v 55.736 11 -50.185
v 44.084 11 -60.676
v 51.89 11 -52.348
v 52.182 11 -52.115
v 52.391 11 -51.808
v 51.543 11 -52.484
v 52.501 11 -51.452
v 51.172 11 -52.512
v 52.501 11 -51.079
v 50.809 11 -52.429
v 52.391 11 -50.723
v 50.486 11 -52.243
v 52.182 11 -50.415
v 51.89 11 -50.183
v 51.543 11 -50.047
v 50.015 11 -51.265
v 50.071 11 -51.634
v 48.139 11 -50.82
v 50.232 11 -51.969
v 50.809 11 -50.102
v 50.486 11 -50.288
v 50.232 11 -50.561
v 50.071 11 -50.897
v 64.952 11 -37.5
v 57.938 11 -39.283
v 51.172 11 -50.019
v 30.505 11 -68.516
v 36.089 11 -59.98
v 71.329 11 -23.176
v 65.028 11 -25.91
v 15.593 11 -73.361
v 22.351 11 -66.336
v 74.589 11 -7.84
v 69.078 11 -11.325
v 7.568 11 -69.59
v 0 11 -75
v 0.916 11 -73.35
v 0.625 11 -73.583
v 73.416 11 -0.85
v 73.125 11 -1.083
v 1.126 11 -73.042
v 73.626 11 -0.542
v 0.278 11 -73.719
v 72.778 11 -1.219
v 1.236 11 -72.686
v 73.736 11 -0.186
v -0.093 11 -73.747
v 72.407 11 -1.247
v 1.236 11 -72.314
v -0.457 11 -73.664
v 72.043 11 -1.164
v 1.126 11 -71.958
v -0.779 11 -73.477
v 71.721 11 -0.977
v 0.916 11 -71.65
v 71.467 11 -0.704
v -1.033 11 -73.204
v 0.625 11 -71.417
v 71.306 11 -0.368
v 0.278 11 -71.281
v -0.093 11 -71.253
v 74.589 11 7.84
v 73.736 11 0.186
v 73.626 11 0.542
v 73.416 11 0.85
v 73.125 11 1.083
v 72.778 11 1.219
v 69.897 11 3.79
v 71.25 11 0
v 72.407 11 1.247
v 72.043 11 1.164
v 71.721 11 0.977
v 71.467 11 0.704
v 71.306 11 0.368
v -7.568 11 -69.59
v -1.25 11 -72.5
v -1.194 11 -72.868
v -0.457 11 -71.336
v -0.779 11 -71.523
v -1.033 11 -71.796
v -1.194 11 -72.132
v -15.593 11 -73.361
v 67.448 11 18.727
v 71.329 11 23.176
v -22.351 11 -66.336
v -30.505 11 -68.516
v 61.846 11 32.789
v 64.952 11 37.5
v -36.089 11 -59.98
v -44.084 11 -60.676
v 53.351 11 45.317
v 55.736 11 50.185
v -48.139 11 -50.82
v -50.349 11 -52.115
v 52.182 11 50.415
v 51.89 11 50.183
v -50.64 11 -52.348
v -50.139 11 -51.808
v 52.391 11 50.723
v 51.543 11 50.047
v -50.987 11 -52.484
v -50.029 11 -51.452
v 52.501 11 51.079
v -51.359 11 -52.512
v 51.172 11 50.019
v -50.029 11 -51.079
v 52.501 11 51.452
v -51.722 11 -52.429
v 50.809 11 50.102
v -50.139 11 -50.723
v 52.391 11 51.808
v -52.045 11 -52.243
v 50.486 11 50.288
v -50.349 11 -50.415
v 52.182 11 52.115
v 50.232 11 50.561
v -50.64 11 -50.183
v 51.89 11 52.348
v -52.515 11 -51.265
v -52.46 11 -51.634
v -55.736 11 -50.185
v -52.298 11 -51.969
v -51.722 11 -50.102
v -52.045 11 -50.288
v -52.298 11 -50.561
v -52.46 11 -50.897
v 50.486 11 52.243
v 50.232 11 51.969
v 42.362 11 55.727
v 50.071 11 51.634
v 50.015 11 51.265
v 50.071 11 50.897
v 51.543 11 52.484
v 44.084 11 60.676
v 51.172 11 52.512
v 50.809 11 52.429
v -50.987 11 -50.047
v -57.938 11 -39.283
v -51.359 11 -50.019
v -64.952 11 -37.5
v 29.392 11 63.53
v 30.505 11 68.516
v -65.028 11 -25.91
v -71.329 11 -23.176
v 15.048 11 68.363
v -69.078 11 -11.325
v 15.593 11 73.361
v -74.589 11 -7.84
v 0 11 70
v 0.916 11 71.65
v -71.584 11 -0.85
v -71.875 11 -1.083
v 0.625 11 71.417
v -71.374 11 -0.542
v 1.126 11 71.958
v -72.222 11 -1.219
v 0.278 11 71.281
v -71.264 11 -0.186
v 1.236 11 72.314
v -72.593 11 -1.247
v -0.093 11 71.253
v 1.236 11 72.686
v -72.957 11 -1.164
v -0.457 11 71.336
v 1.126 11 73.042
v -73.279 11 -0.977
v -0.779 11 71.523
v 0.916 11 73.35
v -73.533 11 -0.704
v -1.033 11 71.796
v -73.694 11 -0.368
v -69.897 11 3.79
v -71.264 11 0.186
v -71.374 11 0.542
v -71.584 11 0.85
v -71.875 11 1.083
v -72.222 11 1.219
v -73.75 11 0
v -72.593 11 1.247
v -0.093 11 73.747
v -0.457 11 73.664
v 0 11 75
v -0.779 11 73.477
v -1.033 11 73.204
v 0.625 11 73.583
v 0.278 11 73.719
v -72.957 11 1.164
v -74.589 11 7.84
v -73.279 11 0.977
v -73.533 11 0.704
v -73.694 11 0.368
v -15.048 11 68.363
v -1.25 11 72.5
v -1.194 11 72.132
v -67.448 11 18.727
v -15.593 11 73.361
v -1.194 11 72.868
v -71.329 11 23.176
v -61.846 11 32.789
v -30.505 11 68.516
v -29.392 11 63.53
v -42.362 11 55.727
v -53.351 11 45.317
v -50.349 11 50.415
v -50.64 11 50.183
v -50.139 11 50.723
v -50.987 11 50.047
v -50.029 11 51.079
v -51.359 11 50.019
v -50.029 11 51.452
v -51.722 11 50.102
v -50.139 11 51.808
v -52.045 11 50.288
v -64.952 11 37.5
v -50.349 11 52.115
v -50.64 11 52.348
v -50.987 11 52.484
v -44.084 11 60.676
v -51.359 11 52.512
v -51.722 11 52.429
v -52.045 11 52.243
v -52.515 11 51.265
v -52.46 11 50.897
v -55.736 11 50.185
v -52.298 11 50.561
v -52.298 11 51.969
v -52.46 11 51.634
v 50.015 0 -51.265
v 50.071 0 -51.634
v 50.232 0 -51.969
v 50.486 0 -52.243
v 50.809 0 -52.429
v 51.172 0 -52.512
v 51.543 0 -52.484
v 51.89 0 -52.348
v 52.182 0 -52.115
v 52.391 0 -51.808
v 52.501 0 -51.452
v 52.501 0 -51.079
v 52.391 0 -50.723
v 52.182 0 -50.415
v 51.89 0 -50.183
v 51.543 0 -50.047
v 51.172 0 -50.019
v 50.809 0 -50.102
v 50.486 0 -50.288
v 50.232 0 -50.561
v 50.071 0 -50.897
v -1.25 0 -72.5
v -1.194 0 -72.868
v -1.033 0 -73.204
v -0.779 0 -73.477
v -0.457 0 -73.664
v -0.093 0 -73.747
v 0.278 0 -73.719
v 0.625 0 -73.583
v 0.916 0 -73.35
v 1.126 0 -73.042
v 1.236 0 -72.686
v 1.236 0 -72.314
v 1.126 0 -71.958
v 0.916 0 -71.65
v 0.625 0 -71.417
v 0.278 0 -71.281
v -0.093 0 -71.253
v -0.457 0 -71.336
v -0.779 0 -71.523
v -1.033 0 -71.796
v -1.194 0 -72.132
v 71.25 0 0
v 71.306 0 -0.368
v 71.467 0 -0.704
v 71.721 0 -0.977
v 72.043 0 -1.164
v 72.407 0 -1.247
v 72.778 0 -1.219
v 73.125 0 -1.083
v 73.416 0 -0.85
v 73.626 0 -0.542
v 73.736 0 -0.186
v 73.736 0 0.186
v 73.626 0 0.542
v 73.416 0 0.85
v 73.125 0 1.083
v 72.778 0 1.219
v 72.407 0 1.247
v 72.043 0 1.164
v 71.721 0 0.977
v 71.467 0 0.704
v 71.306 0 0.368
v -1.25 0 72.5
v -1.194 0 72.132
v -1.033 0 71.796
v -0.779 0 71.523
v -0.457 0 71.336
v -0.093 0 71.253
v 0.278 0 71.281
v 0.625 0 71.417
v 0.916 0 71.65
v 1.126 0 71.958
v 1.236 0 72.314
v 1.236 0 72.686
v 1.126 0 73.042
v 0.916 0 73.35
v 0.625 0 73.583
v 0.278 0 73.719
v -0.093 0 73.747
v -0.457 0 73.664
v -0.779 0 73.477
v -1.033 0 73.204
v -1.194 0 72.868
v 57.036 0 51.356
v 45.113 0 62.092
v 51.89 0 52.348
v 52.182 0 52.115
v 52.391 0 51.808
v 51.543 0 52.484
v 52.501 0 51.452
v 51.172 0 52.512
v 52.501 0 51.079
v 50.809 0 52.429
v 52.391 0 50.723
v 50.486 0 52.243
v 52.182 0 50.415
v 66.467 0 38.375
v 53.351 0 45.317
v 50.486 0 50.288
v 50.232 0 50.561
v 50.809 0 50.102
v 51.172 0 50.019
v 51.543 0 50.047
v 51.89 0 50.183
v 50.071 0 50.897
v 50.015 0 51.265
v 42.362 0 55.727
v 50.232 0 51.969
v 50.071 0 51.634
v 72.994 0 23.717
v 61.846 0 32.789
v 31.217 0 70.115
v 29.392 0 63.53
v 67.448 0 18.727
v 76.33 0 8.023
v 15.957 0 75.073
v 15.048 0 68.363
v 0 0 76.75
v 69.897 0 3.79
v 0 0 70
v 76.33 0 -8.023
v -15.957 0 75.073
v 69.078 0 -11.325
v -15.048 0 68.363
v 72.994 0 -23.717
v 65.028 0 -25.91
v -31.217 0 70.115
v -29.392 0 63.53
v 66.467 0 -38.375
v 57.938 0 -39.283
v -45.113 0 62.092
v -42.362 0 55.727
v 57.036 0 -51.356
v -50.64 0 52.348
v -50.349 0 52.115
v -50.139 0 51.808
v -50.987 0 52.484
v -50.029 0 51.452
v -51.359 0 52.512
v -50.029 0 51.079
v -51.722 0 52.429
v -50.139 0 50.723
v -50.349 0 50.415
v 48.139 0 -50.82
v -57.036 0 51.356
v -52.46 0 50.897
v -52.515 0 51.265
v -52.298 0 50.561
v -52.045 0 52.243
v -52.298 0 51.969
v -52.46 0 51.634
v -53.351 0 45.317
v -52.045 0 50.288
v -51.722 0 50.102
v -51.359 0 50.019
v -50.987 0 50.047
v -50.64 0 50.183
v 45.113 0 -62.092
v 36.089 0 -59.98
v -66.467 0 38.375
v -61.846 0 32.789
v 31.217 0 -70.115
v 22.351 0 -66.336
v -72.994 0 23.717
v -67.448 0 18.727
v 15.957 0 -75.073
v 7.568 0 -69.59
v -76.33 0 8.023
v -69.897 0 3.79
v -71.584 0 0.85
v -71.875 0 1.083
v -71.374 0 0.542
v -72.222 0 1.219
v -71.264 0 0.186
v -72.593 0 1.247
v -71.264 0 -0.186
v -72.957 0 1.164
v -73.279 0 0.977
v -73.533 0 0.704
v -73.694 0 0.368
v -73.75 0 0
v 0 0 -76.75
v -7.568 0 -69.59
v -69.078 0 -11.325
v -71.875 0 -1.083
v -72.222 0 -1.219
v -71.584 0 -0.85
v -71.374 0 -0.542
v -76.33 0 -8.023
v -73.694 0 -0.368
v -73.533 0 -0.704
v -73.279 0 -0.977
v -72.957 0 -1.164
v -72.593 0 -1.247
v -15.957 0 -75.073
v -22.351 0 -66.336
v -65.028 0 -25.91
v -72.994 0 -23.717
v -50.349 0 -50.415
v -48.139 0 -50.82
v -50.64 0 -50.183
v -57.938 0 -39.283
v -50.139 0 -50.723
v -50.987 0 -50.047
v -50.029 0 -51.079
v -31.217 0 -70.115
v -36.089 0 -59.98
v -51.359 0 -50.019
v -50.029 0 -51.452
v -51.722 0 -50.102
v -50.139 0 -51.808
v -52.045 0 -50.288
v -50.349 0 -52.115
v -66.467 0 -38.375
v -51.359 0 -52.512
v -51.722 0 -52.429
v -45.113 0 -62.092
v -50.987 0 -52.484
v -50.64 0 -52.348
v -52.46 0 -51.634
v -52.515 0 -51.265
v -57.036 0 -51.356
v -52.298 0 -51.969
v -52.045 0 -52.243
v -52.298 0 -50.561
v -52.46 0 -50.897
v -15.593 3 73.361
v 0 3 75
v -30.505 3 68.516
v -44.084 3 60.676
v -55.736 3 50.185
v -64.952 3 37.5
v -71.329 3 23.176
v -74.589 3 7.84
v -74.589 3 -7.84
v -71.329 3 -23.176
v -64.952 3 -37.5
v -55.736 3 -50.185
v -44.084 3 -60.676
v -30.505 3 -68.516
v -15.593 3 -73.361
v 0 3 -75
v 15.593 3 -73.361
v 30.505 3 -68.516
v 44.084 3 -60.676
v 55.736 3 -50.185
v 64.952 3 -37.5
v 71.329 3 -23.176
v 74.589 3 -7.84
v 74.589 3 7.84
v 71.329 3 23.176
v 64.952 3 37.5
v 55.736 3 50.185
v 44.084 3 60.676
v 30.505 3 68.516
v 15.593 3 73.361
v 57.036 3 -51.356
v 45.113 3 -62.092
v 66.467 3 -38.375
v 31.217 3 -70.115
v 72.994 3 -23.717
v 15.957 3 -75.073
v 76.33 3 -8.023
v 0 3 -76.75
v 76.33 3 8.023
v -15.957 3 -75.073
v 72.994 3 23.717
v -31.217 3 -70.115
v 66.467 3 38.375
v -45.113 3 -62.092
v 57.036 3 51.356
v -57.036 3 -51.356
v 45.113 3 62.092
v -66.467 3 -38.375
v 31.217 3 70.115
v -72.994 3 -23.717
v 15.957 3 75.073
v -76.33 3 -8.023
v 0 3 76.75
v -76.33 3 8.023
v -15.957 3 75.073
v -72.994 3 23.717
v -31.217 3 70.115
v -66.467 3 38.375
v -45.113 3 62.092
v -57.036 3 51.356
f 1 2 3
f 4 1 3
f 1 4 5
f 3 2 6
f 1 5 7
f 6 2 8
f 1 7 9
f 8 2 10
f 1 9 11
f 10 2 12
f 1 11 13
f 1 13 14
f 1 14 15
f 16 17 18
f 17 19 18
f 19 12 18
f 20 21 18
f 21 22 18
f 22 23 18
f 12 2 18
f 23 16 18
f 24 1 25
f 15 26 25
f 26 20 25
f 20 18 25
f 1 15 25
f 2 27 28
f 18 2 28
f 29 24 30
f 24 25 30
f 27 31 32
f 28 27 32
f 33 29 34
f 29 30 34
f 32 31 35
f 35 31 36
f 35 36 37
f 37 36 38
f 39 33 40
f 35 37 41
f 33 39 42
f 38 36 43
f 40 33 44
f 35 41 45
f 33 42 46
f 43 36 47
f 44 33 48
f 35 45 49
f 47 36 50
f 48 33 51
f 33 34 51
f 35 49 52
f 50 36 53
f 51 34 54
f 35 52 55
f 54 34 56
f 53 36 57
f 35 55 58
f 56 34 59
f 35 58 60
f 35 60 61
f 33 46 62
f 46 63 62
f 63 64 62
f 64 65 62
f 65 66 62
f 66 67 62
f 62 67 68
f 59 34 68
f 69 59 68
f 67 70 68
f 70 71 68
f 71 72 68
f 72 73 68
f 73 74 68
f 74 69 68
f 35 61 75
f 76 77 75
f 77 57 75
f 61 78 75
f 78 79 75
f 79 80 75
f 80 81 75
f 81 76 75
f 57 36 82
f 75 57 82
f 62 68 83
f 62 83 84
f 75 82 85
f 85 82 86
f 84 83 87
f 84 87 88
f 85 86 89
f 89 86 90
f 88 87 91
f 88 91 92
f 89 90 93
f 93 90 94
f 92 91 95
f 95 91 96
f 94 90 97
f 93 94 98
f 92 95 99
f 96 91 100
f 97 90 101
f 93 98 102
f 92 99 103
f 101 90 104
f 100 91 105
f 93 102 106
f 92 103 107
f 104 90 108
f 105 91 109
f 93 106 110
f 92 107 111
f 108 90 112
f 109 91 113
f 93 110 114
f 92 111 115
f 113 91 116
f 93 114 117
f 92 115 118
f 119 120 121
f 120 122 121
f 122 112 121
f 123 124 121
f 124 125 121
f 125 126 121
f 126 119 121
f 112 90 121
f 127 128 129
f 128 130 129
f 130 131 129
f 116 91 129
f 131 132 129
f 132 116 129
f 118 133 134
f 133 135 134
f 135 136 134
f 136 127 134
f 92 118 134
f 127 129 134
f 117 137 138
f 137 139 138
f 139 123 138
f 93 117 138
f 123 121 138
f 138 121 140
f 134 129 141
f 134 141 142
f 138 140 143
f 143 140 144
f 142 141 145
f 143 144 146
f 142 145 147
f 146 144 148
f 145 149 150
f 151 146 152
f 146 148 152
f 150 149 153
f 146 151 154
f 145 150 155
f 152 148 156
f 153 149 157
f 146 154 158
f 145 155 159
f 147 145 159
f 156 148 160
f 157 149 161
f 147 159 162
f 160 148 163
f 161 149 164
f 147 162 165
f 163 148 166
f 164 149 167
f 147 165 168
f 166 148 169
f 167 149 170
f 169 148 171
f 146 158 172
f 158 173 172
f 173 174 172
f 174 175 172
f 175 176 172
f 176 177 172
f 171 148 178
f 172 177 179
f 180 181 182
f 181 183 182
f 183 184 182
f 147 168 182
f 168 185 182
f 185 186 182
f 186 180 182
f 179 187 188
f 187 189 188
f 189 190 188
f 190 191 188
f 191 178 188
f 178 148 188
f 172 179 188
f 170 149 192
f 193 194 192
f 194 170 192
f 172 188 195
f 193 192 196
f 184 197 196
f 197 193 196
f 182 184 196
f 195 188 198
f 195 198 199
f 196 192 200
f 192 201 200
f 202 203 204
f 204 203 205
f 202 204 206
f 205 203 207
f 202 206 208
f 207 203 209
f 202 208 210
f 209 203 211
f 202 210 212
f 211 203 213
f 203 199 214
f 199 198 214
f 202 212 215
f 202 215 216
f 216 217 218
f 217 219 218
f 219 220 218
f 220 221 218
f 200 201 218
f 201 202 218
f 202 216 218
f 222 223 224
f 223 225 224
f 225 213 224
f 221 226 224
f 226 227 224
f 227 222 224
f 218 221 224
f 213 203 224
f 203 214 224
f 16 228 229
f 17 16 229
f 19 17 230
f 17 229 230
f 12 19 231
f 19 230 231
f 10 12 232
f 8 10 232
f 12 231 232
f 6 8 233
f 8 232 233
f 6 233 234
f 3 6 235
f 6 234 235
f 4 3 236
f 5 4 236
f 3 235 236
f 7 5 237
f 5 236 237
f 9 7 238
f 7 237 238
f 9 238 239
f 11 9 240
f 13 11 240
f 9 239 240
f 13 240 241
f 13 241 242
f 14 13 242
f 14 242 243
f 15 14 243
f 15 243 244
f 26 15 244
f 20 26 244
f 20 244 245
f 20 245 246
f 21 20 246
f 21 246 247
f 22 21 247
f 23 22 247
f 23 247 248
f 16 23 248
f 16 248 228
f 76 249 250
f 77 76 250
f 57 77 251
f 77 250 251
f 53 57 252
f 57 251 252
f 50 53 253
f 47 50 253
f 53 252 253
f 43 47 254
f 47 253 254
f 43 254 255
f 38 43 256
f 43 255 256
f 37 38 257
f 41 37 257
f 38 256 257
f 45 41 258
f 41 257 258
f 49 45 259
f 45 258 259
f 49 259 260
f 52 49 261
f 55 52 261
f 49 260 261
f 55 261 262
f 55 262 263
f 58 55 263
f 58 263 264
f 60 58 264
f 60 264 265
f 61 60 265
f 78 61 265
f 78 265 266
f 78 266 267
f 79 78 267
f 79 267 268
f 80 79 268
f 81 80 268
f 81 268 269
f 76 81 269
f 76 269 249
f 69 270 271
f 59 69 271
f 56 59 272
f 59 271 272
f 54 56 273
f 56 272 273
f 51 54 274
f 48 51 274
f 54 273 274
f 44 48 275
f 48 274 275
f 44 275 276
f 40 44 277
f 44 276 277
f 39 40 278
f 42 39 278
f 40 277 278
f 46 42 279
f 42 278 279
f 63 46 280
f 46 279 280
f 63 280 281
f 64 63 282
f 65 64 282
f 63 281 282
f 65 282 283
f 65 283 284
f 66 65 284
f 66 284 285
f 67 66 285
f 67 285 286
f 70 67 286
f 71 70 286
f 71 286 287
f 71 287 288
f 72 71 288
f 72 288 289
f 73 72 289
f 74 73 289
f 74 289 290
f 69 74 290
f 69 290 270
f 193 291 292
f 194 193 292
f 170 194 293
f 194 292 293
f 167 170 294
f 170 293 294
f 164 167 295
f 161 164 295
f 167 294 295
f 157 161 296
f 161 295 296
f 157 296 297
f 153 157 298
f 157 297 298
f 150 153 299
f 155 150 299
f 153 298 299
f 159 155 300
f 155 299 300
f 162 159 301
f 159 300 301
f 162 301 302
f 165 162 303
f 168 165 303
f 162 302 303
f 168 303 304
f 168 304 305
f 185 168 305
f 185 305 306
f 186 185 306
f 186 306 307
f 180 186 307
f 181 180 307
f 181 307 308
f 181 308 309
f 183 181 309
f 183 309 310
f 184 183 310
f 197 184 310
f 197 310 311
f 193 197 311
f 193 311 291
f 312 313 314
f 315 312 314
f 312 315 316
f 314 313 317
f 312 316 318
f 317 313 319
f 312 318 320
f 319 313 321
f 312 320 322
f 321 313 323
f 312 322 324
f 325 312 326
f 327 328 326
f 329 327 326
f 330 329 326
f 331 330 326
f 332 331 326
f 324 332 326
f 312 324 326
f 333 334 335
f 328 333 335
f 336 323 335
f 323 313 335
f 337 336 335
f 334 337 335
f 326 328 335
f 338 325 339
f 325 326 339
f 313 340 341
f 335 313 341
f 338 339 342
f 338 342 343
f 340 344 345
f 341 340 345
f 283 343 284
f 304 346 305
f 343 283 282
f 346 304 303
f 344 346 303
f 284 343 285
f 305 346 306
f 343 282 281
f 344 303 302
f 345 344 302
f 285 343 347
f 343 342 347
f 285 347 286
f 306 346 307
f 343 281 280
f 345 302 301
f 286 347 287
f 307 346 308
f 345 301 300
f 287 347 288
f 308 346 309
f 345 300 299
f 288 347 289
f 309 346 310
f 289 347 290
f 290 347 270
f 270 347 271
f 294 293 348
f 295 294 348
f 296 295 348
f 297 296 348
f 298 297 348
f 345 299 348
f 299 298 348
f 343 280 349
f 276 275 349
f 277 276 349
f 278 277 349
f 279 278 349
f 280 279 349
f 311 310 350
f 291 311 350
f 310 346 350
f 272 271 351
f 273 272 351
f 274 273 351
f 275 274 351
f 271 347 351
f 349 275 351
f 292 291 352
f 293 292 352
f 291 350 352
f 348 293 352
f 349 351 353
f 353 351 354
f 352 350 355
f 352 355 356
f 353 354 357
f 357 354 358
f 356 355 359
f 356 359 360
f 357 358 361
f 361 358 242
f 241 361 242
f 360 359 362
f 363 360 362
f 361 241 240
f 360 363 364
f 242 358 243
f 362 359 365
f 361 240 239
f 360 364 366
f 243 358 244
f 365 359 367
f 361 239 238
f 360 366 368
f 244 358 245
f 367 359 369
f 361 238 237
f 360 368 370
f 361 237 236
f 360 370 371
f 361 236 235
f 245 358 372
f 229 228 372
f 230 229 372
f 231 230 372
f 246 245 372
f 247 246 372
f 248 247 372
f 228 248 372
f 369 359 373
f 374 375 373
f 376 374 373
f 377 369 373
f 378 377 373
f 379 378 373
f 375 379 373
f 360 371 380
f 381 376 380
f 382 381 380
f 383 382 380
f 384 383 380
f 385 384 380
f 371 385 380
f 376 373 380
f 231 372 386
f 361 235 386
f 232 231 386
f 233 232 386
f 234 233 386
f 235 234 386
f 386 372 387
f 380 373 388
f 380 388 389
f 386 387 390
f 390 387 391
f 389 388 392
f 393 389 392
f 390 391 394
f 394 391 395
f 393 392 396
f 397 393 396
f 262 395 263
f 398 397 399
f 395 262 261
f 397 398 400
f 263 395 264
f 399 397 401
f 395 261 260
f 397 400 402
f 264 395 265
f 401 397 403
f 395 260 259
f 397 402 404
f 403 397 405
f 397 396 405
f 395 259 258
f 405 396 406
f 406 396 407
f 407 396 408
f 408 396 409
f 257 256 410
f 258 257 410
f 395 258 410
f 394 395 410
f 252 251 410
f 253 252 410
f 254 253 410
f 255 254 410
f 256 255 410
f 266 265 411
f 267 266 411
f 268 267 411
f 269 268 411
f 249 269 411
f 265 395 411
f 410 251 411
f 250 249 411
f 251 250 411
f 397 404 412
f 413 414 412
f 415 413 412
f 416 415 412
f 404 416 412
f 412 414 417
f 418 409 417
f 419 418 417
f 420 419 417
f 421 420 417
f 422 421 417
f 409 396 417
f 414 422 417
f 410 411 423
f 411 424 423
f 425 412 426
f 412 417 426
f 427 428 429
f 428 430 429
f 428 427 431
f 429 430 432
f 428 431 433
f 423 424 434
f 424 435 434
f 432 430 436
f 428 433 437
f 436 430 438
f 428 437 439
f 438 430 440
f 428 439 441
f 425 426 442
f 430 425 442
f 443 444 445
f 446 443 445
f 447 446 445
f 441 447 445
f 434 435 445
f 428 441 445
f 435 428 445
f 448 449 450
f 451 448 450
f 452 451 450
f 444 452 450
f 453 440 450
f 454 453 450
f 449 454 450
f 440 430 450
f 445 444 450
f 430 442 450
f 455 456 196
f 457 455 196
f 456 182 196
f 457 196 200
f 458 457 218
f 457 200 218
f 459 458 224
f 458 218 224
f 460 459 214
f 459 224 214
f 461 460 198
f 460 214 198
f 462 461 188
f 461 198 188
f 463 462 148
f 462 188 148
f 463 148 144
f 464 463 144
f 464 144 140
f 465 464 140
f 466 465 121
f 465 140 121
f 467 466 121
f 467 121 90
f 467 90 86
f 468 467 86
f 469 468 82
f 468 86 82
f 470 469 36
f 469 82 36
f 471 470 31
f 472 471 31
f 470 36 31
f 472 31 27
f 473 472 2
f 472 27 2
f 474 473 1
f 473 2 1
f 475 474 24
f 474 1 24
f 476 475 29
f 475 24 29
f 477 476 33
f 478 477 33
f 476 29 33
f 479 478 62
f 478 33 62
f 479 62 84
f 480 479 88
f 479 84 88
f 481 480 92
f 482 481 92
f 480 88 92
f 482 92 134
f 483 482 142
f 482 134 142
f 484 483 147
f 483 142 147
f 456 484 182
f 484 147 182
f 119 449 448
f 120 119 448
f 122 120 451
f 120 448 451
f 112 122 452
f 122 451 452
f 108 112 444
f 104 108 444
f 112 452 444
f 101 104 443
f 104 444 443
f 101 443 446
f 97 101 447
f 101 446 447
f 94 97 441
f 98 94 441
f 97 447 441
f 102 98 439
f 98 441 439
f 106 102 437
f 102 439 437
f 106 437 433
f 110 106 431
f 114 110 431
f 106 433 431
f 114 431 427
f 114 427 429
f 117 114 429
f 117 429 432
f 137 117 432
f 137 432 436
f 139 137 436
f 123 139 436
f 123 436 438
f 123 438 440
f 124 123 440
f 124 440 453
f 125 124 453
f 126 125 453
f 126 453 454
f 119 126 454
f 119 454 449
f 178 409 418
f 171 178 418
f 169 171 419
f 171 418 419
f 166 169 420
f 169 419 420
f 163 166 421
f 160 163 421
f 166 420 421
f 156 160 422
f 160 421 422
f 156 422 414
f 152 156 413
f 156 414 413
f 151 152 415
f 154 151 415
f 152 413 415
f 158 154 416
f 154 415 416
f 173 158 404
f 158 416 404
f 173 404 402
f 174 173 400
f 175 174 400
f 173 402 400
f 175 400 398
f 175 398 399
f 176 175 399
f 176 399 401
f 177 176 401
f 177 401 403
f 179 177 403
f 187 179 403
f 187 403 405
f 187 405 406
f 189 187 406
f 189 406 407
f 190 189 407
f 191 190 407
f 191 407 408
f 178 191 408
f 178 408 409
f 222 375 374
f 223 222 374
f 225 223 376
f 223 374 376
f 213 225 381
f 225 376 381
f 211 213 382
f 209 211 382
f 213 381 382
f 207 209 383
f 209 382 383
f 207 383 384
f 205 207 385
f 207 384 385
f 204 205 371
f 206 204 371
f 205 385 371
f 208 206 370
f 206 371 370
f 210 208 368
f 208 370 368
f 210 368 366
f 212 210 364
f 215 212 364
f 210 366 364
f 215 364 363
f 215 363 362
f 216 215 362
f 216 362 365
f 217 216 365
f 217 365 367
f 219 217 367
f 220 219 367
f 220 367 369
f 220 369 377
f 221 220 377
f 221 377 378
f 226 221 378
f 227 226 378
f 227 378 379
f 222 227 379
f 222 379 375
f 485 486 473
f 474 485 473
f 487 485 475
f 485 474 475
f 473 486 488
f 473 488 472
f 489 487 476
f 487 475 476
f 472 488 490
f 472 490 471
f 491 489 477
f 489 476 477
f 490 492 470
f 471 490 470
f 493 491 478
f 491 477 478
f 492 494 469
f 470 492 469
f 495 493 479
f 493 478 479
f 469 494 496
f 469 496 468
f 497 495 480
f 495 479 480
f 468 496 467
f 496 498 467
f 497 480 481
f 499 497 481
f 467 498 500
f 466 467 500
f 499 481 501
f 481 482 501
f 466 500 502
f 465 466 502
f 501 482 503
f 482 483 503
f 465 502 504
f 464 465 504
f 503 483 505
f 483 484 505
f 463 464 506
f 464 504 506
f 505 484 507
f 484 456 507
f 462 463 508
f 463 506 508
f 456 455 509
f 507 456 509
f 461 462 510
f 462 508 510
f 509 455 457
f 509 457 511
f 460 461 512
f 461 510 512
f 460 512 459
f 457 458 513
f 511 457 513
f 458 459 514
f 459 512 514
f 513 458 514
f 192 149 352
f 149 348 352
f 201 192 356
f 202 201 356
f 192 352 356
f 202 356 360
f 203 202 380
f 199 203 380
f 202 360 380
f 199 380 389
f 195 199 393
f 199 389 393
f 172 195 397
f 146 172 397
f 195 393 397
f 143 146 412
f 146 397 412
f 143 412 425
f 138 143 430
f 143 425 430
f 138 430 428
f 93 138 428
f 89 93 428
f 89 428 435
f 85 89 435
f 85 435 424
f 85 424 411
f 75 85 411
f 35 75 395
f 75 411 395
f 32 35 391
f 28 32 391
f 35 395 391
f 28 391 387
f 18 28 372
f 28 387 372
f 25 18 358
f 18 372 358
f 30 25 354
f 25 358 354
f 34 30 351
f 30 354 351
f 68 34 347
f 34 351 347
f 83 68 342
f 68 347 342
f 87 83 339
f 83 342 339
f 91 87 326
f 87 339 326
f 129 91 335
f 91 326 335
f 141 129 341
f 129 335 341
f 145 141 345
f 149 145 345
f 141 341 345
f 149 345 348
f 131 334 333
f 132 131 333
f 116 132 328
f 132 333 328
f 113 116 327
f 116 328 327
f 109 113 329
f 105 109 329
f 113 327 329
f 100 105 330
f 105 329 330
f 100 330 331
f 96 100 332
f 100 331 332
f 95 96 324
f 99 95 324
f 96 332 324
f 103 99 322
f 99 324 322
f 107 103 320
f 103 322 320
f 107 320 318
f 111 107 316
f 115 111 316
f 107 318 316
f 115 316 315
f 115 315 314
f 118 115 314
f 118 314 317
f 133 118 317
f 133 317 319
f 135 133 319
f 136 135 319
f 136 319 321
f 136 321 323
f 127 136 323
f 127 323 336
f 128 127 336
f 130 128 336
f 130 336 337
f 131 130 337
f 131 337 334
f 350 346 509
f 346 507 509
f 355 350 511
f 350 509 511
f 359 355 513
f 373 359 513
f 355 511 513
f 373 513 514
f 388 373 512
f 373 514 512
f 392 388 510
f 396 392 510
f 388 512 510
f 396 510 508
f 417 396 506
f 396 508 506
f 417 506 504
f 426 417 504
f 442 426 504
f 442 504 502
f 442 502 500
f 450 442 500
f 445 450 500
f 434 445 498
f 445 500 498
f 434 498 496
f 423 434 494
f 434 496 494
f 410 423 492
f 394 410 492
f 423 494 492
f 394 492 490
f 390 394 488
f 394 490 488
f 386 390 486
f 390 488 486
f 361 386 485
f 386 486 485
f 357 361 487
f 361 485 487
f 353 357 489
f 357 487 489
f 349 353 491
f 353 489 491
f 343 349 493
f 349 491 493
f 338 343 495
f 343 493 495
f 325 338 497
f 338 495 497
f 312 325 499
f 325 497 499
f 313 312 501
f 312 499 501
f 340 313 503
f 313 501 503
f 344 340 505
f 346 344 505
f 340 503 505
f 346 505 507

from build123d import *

# Parameters (mm, degrees)
HOLE_WIZARD_M3_1_D = 2.5


with BuildPart() as part:
    # 草图1 → 旋转1 (revolve)
    with BuildSketch(Plane.XY, mode=Mode.PRIVATE) as revolve_1_sk:
        Polygon((70, 0), (76.75, 0), (76.75, 3), (75, 3), (75, 11), (70, 11), align=None)
    revolve(revolve_1_sk.sketch.rotate(Axis((0, 51.694672702, 0), (0, -1, 0)), 90), axis=Axis((0, 51.694672702, 0), (0, -1, 0)))

    # M3 螺纹孔1 (through all)
    with Locations(Plane(origin=(0, 11, 0), x_dir=(1, 0, 0), z_dir=(0, 1, 0))):
        with Locations((-51.265241636, 51.265241636), (0, 72.5), (51.265241636, 51.265241636), (72.5, 0), (51.265241636, -51.265241636), (0, -72.5), (-51.265241636, -51.265241636), (-72.5, 0)):
            Hole(HOLE_WIZARD_M3_1_D / 2)


solid = part.part
